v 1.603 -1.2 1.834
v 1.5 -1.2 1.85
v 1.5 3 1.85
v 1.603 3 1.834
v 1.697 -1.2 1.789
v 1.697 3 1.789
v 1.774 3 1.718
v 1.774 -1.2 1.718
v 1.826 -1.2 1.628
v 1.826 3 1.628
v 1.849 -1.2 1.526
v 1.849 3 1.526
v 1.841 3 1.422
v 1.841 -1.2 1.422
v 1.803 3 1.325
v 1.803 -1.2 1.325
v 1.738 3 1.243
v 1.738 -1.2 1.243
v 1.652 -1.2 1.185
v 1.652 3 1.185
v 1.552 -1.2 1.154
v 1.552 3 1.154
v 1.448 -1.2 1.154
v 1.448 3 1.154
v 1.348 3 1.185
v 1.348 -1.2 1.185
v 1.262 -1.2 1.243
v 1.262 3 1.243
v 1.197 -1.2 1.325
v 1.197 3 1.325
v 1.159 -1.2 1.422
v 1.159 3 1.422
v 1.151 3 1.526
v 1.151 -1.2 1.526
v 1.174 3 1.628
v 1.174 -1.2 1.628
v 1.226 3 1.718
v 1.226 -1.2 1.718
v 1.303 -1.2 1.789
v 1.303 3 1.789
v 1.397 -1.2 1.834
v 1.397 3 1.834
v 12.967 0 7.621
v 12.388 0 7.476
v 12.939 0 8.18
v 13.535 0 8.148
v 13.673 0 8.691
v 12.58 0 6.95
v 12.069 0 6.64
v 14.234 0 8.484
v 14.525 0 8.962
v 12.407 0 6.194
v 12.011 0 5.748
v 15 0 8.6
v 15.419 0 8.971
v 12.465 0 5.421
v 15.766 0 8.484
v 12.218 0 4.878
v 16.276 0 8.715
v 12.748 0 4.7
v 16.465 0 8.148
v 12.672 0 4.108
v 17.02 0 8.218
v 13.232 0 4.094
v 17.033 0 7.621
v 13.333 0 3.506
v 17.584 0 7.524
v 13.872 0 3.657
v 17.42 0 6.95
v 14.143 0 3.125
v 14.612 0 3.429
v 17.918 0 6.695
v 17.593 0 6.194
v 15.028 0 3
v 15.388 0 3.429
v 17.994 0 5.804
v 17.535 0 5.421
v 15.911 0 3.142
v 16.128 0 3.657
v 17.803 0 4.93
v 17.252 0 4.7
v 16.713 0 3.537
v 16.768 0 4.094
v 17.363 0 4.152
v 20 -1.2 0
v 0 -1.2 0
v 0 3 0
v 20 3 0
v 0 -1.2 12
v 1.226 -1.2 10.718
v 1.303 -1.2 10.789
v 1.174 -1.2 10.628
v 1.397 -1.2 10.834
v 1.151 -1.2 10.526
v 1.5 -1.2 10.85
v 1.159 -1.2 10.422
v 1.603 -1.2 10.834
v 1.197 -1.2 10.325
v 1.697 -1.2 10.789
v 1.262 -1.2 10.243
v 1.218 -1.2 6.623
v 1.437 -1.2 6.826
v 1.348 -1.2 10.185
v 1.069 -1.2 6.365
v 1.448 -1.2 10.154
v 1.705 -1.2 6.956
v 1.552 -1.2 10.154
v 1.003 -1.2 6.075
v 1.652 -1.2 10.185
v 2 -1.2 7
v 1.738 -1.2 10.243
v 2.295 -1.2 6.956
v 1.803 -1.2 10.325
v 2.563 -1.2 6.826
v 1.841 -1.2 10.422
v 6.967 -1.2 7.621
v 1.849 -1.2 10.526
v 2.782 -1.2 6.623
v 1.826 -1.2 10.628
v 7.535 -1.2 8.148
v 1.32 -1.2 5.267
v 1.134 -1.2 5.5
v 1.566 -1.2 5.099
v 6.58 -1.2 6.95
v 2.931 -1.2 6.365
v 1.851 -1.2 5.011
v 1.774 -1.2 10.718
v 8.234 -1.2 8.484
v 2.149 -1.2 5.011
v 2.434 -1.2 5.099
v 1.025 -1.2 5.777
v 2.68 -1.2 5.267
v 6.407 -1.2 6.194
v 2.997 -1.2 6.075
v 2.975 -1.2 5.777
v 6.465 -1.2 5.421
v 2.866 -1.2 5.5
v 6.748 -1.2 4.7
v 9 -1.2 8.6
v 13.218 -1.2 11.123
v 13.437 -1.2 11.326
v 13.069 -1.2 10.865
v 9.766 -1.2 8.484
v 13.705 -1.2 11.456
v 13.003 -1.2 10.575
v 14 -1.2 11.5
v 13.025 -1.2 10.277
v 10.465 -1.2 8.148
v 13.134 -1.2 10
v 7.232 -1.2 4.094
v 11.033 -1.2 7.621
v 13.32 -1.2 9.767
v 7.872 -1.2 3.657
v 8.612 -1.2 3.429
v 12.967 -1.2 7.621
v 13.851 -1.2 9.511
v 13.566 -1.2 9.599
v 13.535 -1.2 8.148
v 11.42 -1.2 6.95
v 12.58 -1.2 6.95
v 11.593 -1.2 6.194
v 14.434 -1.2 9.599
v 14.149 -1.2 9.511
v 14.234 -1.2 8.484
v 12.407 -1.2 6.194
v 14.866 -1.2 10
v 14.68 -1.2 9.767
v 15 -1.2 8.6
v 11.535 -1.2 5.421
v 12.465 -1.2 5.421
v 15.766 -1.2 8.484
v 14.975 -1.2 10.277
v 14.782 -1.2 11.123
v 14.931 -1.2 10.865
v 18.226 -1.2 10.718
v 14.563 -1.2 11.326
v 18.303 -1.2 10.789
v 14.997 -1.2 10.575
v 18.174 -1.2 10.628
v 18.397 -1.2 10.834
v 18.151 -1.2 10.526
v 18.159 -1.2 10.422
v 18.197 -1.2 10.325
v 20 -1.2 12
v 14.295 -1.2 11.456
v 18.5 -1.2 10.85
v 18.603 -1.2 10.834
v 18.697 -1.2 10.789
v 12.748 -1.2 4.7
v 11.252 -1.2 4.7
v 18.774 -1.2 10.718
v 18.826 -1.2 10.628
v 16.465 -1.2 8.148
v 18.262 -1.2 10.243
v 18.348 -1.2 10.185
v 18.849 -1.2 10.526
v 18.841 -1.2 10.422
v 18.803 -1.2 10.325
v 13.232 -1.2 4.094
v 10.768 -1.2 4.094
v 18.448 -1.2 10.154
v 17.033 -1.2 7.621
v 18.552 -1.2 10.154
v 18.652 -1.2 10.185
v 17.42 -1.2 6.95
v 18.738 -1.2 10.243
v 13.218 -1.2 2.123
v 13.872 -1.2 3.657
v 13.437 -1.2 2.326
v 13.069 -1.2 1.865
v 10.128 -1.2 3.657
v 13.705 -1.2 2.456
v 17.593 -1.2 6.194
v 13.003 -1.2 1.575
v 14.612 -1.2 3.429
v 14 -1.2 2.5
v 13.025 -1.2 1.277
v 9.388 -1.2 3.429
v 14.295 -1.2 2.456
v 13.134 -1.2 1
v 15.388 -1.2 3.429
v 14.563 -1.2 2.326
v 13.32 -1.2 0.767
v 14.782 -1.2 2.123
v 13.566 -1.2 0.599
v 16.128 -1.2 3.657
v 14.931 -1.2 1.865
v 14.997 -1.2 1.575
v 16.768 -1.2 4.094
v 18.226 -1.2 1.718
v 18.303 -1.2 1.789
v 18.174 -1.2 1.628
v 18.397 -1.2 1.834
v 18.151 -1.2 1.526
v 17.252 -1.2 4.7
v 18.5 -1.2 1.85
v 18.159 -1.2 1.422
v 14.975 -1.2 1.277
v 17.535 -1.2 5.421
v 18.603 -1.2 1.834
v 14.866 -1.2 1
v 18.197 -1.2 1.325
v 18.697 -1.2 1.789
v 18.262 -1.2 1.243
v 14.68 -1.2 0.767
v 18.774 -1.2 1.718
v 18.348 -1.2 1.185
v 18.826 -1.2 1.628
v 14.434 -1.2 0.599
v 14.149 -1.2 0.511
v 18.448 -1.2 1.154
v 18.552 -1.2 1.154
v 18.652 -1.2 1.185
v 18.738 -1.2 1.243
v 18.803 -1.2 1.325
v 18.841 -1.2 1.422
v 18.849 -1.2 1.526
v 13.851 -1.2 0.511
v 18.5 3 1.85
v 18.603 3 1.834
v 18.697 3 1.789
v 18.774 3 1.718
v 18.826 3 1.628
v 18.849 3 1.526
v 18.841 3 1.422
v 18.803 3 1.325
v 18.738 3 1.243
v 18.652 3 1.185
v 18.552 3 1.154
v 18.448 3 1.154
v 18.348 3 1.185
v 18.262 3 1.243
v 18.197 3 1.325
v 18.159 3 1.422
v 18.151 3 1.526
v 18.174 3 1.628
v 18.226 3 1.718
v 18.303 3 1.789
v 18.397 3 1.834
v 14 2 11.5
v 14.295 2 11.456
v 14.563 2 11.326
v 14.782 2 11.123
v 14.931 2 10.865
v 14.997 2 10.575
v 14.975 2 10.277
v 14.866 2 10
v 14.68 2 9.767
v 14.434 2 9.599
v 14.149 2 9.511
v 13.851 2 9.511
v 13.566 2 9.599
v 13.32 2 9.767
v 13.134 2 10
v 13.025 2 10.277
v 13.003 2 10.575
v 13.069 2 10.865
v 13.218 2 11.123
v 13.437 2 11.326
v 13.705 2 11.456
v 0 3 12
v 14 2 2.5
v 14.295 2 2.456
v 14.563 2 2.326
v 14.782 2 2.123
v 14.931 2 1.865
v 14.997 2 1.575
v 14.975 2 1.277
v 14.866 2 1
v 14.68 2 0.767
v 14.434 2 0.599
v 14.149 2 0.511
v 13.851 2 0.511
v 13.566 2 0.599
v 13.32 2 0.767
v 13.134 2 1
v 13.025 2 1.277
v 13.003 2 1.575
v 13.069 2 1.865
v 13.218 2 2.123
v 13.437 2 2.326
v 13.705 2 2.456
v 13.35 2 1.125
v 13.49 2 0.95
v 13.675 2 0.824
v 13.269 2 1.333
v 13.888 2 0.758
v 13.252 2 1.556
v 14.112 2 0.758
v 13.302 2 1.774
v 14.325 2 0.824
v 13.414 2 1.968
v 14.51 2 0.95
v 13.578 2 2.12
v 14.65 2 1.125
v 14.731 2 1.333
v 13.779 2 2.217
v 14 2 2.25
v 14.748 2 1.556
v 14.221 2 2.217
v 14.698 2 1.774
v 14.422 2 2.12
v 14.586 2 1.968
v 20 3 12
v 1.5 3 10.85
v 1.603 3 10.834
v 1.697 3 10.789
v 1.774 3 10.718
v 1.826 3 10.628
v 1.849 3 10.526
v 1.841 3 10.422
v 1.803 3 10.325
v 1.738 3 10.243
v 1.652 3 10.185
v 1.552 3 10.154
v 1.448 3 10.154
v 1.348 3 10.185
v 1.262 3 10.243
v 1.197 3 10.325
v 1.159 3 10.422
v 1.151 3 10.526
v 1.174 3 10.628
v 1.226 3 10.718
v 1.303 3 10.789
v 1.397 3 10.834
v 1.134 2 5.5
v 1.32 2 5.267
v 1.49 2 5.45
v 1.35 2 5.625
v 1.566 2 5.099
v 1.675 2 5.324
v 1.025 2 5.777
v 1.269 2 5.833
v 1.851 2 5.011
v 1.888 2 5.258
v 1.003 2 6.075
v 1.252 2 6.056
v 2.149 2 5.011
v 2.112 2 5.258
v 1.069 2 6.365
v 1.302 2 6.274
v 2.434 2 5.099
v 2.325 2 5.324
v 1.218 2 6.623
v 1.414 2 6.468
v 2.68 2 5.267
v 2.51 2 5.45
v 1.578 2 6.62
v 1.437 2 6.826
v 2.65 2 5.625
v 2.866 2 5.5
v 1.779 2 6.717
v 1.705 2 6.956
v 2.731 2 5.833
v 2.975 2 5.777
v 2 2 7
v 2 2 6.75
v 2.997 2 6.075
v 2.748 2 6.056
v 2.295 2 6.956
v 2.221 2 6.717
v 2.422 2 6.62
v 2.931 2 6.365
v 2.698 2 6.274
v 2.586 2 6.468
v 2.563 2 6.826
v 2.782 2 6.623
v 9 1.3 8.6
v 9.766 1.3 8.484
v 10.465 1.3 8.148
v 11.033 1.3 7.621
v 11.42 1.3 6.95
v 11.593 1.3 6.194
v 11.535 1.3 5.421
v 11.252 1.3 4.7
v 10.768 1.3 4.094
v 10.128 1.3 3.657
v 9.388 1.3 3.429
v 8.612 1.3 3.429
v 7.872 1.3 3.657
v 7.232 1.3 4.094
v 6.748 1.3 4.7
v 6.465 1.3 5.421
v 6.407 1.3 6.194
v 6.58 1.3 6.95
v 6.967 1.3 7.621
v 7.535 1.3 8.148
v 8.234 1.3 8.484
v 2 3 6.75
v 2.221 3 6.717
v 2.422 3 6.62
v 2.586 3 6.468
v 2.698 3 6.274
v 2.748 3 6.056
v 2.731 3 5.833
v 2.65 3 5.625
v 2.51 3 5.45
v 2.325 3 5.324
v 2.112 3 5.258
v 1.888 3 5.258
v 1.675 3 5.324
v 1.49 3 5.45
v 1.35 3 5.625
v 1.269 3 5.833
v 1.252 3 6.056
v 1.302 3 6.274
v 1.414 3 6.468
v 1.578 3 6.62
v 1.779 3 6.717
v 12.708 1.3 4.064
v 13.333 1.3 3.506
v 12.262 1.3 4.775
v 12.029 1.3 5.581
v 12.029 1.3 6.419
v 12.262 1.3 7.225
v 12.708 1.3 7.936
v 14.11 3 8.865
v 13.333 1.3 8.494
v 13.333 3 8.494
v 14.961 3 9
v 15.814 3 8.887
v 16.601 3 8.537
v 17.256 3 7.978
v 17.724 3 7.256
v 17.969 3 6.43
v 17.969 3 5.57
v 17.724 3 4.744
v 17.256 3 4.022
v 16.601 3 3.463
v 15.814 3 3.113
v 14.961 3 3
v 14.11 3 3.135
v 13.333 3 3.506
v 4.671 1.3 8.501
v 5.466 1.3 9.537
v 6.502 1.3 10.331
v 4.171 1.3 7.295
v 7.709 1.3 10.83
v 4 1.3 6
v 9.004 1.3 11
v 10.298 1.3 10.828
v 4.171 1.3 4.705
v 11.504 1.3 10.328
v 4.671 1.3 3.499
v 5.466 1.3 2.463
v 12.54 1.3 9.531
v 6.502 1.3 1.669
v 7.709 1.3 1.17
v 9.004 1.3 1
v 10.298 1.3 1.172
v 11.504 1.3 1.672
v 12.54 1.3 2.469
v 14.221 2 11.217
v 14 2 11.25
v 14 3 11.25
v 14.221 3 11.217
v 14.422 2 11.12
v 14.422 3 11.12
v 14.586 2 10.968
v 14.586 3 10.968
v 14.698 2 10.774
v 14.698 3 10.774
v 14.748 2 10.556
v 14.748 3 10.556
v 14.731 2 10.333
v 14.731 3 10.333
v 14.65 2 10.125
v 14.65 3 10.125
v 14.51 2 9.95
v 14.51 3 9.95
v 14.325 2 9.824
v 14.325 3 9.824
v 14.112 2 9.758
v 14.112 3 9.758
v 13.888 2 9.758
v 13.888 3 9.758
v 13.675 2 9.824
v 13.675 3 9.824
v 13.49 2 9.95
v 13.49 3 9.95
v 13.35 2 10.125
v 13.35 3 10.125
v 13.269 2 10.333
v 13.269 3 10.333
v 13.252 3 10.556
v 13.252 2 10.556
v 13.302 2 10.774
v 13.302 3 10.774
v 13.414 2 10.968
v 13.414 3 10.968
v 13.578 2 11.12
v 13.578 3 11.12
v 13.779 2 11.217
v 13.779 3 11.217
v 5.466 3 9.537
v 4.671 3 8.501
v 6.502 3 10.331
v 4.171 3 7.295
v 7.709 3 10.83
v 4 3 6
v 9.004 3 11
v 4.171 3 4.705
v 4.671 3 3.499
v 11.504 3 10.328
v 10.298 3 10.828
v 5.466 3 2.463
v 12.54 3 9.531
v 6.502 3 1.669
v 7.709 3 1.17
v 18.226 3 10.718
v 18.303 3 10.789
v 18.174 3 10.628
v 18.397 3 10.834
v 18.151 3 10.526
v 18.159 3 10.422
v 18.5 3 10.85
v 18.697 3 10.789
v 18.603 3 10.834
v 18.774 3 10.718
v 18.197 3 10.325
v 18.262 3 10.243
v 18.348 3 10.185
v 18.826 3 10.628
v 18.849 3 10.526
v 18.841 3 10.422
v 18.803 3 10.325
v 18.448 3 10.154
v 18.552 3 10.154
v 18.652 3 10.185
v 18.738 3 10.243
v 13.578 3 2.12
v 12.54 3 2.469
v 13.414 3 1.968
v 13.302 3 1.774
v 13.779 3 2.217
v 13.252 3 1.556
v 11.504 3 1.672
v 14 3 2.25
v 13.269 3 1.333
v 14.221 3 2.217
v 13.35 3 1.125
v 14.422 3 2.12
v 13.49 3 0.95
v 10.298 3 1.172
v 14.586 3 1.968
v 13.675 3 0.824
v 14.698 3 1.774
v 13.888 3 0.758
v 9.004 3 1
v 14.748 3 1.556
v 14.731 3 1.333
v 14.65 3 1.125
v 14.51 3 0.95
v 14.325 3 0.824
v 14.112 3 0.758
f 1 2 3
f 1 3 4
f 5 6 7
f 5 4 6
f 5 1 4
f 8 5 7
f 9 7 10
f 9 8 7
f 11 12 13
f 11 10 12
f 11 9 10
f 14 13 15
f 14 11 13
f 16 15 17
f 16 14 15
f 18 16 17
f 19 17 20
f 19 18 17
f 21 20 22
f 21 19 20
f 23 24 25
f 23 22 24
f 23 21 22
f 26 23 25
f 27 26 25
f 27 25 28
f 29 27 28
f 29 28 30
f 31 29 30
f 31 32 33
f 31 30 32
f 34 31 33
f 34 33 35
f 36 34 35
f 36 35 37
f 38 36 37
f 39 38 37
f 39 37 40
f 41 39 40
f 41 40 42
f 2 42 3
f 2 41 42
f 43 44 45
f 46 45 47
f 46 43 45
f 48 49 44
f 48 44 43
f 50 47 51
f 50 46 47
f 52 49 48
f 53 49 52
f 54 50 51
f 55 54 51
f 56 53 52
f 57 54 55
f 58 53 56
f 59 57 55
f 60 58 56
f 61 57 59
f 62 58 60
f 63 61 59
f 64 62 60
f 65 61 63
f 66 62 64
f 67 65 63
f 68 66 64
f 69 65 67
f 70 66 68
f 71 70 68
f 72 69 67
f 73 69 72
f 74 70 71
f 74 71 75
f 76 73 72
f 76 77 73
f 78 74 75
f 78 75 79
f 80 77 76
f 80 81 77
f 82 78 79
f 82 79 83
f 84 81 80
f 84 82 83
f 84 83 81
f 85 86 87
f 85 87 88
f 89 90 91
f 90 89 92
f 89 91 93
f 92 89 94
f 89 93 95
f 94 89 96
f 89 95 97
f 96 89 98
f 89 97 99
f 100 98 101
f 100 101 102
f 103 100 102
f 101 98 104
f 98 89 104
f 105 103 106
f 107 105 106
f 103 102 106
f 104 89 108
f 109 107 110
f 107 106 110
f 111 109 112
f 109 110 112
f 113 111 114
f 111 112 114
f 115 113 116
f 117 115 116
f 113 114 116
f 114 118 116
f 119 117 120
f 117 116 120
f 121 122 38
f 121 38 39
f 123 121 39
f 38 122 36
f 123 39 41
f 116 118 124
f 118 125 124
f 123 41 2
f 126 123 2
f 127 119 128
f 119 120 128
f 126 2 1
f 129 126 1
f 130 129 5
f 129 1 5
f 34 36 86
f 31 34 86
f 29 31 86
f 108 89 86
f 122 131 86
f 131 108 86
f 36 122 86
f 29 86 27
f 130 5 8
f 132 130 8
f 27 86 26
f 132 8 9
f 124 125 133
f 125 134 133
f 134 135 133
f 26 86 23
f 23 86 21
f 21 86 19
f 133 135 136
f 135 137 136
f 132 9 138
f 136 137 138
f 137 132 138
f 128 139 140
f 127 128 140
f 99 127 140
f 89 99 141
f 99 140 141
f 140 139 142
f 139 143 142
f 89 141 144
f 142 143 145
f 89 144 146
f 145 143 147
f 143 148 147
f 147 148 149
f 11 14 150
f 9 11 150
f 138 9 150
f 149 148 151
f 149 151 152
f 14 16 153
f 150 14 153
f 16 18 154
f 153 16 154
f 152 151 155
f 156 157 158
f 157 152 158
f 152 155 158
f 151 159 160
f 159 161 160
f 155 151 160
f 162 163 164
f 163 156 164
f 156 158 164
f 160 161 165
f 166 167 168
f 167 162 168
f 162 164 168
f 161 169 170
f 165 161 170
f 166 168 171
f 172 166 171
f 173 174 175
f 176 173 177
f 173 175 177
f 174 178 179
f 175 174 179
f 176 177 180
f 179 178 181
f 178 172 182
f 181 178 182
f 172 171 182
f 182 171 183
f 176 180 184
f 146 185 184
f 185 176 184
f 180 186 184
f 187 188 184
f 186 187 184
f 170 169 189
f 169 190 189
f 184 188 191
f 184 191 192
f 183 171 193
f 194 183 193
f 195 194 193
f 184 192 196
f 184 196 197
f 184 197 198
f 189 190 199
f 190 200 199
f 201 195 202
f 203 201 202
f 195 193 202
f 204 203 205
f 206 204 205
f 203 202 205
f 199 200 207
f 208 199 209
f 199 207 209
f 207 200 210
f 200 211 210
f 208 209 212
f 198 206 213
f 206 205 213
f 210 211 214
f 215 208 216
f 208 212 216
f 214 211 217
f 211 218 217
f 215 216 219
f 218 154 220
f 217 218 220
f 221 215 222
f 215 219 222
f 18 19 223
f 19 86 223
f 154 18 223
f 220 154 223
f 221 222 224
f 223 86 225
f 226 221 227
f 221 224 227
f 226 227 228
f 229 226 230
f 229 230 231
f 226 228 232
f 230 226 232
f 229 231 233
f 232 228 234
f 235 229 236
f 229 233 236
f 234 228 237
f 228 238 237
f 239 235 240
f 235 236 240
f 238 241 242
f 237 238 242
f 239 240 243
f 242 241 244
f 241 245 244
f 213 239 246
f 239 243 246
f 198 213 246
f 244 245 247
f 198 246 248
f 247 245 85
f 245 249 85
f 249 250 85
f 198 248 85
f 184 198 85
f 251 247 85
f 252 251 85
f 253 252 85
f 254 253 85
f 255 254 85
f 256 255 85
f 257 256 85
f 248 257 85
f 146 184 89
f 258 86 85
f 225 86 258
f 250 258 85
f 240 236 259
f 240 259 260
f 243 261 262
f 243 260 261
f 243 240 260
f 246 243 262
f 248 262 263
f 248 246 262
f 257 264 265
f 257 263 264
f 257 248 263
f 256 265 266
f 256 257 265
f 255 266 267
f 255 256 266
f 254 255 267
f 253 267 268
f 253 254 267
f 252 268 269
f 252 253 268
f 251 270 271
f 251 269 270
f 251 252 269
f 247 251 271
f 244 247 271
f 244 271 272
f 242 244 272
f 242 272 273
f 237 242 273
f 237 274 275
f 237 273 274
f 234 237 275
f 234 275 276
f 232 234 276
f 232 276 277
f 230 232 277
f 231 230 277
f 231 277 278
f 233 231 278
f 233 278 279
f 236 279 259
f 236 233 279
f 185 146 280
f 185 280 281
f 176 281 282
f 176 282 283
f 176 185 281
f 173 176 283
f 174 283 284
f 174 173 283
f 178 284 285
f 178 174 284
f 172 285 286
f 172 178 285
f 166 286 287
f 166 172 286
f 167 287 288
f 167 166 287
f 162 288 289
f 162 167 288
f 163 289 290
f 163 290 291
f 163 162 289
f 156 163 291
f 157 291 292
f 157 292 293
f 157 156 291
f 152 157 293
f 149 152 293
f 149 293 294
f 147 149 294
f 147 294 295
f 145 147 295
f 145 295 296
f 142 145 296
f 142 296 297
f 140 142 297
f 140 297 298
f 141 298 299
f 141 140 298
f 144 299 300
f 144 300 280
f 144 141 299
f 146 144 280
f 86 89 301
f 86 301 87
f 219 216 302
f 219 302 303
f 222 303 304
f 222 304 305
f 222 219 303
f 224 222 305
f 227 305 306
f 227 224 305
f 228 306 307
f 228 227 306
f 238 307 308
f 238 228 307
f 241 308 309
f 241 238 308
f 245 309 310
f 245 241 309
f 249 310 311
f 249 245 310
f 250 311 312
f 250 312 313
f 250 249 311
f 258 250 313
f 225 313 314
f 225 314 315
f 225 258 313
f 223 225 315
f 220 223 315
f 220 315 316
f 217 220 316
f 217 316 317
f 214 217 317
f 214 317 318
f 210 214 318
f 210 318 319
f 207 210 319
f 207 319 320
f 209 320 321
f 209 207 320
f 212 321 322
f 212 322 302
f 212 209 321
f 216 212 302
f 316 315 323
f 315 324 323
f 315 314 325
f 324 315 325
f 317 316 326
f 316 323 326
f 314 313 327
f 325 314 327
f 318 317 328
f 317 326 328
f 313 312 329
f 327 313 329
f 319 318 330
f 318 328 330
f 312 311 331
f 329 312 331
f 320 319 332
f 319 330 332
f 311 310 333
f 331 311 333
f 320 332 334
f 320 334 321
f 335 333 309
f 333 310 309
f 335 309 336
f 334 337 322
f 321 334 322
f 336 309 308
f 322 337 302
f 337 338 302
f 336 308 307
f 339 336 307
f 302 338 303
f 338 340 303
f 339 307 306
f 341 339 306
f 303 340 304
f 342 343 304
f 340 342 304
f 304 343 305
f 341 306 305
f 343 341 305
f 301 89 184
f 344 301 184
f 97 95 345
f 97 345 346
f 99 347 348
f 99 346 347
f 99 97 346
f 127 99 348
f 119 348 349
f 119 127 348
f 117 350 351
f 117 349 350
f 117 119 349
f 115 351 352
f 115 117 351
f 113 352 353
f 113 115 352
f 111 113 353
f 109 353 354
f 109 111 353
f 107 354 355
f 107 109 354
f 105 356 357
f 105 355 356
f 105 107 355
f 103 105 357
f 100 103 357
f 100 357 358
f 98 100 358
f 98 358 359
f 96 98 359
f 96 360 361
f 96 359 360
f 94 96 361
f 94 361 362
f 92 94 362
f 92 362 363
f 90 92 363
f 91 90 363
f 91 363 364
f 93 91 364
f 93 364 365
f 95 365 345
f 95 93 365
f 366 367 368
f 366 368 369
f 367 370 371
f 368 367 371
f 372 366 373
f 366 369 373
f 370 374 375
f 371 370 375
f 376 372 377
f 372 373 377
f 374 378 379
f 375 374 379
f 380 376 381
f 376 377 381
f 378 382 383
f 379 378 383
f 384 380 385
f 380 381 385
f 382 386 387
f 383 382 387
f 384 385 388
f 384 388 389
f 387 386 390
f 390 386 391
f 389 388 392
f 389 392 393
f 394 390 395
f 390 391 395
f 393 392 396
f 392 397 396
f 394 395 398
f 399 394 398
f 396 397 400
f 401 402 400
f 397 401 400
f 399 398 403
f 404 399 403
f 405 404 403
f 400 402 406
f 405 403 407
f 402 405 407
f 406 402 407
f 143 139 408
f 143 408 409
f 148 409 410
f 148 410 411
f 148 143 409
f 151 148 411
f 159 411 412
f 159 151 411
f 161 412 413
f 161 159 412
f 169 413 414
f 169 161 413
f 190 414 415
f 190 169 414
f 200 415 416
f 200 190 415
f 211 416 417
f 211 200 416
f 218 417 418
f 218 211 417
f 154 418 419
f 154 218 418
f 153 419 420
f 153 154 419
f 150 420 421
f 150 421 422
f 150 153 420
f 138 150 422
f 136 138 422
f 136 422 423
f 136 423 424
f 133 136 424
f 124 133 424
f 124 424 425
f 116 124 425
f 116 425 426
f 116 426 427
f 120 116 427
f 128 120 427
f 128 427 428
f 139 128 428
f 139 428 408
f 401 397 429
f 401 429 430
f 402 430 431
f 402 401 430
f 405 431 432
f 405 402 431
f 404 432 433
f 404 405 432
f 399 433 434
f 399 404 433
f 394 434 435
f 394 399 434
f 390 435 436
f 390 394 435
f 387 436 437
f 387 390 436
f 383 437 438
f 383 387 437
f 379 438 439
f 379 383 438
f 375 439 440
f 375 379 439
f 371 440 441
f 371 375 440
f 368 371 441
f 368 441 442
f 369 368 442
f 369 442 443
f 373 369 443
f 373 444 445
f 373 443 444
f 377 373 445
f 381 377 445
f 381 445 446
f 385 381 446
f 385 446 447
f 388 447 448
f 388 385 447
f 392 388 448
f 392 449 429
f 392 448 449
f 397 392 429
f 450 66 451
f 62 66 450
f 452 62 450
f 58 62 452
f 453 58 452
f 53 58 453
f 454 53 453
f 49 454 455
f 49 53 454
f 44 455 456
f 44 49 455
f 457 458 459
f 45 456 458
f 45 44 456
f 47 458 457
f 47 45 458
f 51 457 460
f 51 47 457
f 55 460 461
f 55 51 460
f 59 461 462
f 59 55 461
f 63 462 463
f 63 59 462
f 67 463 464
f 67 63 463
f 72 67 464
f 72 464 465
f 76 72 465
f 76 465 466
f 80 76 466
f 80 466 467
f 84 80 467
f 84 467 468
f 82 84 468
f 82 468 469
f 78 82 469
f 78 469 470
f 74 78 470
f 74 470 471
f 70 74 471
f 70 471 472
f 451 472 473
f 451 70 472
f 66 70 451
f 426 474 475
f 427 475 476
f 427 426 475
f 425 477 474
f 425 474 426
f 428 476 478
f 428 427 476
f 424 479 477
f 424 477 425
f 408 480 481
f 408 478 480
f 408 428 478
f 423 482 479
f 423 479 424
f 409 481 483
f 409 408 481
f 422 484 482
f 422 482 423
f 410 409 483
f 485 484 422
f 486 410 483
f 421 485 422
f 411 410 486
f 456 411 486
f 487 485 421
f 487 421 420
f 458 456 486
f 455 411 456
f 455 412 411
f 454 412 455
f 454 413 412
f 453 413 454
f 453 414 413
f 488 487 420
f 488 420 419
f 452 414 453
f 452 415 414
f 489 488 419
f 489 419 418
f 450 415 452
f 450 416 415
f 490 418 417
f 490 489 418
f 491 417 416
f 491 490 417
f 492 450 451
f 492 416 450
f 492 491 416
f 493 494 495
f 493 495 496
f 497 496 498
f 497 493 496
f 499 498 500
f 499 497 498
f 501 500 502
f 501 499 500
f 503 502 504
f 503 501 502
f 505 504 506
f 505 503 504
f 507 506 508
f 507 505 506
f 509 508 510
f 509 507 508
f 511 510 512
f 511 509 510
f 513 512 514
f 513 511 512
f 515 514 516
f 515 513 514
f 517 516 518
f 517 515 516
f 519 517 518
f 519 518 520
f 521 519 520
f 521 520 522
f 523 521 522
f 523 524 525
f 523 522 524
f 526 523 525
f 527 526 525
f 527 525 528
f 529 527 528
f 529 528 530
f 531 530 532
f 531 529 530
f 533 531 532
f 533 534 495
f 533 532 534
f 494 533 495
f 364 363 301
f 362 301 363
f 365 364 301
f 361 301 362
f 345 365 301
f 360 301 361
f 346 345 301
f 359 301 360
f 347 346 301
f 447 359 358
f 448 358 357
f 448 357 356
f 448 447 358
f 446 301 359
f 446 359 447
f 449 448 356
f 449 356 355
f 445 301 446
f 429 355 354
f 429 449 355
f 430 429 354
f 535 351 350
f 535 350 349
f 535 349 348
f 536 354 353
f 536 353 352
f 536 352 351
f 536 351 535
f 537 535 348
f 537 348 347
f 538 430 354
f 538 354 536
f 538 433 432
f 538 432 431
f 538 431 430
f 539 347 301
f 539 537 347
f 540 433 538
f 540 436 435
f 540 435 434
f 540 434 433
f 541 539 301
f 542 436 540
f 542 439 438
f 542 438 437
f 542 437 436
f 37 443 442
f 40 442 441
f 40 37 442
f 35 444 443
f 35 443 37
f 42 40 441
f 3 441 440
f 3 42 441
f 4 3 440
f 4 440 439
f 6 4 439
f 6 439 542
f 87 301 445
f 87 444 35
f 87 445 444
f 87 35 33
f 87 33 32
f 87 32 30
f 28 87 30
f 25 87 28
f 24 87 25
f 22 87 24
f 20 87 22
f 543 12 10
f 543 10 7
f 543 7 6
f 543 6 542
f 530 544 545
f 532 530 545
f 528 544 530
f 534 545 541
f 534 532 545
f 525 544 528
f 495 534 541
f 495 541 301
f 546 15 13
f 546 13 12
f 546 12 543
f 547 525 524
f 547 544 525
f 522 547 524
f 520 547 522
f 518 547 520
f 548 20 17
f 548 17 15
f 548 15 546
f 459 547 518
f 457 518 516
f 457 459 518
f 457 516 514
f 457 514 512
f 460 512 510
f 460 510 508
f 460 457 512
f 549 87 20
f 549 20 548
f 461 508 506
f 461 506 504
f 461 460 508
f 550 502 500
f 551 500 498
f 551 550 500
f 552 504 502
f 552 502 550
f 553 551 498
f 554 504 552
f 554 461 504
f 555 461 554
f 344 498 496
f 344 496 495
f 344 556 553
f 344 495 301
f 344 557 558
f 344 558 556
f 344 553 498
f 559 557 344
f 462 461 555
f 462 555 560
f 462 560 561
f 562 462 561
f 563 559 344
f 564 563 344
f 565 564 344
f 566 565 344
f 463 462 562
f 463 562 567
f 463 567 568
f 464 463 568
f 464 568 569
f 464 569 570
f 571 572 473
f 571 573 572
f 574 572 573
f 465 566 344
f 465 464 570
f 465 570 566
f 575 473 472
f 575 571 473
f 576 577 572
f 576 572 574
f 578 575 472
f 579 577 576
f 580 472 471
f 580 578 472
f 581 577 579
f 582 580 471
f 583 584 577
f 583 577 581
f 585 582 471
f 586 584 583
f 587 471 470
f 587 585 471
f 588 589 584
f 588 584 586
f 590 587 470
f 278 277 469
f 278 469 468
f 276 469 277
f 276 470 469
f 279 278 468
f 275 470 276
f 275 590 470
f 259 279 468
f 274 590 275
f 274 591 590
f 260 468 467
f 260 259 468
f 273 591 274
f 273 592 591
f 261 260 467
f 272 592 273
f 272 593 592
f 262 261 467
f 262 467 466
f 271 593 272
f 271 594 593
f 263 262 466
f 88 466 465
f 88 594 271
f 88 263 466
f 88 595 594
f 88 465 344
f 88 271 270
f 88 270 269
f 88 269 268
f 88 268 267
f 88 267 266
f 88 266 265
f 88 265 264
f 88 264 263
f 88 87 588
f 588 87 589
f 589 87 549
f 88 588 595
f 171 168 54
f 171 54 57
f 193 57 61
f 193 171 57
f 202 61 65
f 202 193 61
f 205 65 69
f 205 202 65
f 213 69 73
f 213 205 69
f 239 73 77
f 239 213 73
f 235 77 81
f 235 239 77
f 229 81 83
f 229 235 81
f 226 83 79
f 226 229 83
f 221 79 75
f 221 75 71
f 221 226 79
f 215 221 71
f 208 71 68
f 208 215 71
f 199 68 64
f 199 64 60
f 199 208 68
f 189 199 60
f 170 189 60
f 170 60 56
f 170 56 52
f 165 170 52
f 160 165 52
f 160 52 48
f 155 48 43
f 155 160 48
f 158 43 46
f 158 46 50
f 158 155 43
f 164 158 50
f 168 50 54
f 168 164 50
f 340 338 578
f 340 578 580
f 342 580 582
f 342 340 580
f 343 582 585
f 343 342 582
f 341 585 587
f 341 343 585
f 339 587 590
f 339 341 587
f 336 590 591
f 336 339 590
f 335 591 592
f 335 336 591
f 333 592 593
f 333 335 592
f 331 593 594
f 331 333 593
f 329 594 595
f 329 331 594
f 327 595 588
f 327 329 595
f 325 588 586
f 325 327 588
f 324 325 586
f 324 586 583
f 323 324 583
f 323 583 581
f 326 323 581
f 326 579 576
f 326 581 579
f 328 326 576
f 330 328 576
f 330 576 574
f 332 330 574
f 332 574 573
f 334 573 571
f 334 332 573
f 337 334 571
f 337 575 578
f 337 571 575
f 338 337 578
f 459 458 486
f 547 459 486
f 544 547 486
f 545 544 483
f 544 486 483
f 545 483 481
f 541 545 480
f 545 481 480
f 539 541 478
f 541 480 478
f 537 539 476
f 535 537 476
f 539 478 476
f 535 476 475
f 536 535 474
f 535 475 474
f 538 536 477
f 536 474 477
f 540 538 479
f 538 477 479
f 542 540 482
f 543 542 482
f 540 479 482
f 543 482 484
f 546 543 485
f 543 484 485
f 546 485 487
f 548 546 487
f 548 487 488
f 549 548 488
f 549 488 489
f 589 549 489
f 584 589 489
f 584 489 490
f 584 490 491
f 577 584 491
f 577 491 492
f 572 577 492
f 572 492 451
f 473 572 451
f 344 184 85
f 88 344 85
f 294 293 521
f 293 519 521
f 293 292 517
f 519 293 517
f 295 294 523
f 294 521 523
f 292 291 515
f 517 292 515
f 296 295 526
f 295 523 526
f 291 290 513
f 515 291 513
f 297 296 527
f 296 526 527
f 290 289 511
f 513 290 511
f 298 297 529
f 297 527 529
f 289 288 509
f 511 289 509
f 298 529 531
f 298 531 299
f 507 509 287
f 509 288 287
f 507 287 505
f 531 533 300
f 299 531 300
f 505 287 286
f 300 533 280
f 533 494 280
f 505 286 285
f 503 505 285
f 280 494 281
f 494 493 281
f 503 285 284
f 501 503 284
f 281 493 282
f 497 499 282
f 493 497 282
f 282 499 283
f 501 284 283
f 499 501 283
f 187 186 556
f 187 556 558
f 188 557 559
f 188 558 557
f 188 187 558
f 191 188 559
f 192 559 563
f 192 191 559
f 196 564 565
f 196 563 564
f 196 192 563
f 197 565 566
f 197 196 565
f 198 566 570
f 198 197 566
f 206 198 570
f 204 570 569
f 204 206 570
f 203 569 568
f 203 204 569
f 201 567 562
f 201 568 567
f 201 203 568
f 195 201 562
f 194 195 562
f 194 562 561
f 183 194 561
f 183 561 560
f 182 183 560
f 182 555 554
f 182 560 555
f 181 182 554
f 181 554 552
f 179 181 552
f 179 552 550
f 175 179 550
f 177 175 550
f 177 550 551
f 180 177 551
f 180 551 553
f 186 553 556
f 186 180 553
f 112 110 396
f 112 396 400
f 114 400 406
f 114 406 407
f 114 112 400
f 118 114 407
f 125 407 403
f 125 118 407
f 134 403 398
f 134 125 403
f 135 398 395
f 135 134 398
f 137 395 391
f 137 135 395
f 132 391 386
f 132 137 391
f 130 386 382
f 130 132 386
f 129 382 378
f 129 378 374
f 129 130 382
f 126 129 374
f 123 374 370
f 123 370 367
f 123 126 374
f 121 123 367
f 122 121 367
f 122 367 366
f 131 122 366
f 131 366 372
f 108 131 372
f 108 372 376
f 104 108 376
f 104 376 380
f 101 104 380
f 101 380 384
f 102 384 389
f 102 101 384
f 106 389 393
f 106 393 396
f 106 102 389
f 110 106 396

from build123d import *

# Parameters (mm, degrees)
SKETCH_1_W               = 20
SKETCH_1_H               = 12
EXTRUDE_1_DEPTH          = 3
EXTRUDE_3_DEPTH          = 1.3
EXTRUDE_3_DEPTH_BACK     = 1.2
SKETCH_1_13_W            = 20
SKETCH_1_13_H            = 12
SKETCH_1_13_R            = 2.6
SKETCH_1_13_R_2          = 3
EXTRUDE_START            = -1.2
SKETCH_1_14_W            = 20
SKETCH_1_14_H            = 12
SKETCH_1_14_R            = 2.6
EXTRUDE_4_DEPTH          = 1.2
CUT_EXTRUDE_3_DEPTH      = 24.515952033
CUT_EXTRUDE_3_DEPTH_BACK = 24.515952033
SKETCH_3_R               = 0.75
SKETCH_3_R_2             = 0.35
CUT_EXTRUDE_START        = -1.2
SKETCH_3_4_R             = 1
CUT_EXTRUDE_4_DEPTH      = 3.2


with BuildPart() as part:
    # 草图1 → 凸台-拉伸1 (new body)
    with BuildSketch(Plane(origin=(0, 0, 0), x_dir=(1, 0, 0), z_dir=(0, 1, 0))):
        with Locations((10, -6)):
            Rectangle(SKETCH_1_W, SKETCH_1_H)
        with BuildLine():
            ThreePointArc((13.333333333, -3.505561742), (18, -6), (13.333333333, -8.494438258))
            ThreePointArc((13.333333333, -8.494438258), (4, -6), (13.333333333, -3.505561742))
        make_face(mode=Mode.SUBTRACT)
    extrude(amount=EXTRUDE_1_DEPTH)

    # 草图1<13> → 凸台-拉伸3 (add, two sides: drawn at the far end of the back side and taken through both)
    with BuildSketch(Plane(origin=(0, 0, 0), x_dir=(1, 0, 0), z_dir=(0, 1, 0)).offset(-EXTRUDE_3_DEPTH_BACK)):
        with Locations((10, -6)):
            Rectangle(SKETCH_1_13_W, SKETCH_1_13_H)
        with Locations(Location((9, -6, 0), (0, 0, 270))):
            Circle(SKETCH_1_13_R, mode=Mode.SUBTRACT)
        with Locations(Location((15, -6, 0), (0, 0, 123.748988596))):
            Circle(SKETCH_1_13_R_2, mode=Mode.SUBTRACT)
    extrude(amount=EXTRUDE_3_DEPTH + EXTRUDE_3_DEPTH_BACK)

    # 草图1<14> → 凸台-拉伸4 (add)
    with BuildSketch(Plane(origin=(0, 0, 0), x_dir=(1, 0, 0), z_dir=(0, 1, 0)).offset(EXTRUDE_START)):
        with Locations((10, -6)):
            Rectangle(SKETCH_1_14_W, SKETCH_1_14_H)
        with Locations(Location((15, -6, 0), (0, 0, 270))):
            Circle(SKETCH_1_14_R, mode=Mode.SUBTRACT)
        with Locations(Location((9, -6, 0), (0, 0, 270))):
            Circle(SKETCH_1_14_R, mode=Mode.SUBTRACT)
    extrude(amount=EXTRUDE_4_DEPTH)

    # 草图3 → 切除-拉伸3 (cut, two sides: drawn at the far end of the back side and taken through both)
    with BuildSketch(Plane(origin=(0, 0, 0), x_dir=(1, 0, 0), z_dir=(0, 1, 0)).offset(-CUT_EXTRUDE_3_DEPTH_BACK)):
        with Locations(Location((2, -6, 0), (0, 0, 270))):
            Circle(SKETCH_3_R)
        with Locations(Location((14, -1.5, 0), (0, 0, 270))):
            Circle(SKETCH_3_R)
        with Locations(Location((14, -10.5, 0), (0, 0, 270))):
            Circle(SKETCH_3_R)
        with Locations(Location((1.5, -1.5, 0), (0, 0, 270))):
            Circle(SKETCH_3_R_2)
        with Locations(Location((18.5, -1.5, 0), (0, 0, 270))):
            Circle(SKETCH_3_R_2)
        with Locations(Location((1.5, -10.5, 0), (0, 0, 270))):
            Circle(SKETCH_3_R_2)
        with Locations(Location((18.5, -10.5, 0), (0, 0, 270))):
            Circle(SKETCH_3_R_2)
    extrude(amount=CUT_EXTRUDE_3_DEPTH + CUT_EXTRUDE_3_DEPTH_BACK, mode=Mode.SUBTRACT)

    # 草图3<4> → 切除-拉伸4 (cut)
    with BuildSketch(Plane(origin=(0, 0, 0), x_dir=(1, 0, 0), z_dir=(0, 1, 0)).offset(CUT_EXTRUDE_START)):
        with Locations(Location((2, -6, 0), (0, 0, 270))):
            Circle(SKETCH_3_4_R)
        with Locations(Location((14, -1.5, 0), (0, 0, 270))):
            Circle(SKETCH_3_4_R)
        with Locations(Location((14, -10.5, 0), (0, 0, 270))):
            Circle(SKETCH_3_4_R)
    extrude(amount=CUT_EXTRUDE_4_DEPTH, mode=Mode.SUBTRACT)


solid = part.part
